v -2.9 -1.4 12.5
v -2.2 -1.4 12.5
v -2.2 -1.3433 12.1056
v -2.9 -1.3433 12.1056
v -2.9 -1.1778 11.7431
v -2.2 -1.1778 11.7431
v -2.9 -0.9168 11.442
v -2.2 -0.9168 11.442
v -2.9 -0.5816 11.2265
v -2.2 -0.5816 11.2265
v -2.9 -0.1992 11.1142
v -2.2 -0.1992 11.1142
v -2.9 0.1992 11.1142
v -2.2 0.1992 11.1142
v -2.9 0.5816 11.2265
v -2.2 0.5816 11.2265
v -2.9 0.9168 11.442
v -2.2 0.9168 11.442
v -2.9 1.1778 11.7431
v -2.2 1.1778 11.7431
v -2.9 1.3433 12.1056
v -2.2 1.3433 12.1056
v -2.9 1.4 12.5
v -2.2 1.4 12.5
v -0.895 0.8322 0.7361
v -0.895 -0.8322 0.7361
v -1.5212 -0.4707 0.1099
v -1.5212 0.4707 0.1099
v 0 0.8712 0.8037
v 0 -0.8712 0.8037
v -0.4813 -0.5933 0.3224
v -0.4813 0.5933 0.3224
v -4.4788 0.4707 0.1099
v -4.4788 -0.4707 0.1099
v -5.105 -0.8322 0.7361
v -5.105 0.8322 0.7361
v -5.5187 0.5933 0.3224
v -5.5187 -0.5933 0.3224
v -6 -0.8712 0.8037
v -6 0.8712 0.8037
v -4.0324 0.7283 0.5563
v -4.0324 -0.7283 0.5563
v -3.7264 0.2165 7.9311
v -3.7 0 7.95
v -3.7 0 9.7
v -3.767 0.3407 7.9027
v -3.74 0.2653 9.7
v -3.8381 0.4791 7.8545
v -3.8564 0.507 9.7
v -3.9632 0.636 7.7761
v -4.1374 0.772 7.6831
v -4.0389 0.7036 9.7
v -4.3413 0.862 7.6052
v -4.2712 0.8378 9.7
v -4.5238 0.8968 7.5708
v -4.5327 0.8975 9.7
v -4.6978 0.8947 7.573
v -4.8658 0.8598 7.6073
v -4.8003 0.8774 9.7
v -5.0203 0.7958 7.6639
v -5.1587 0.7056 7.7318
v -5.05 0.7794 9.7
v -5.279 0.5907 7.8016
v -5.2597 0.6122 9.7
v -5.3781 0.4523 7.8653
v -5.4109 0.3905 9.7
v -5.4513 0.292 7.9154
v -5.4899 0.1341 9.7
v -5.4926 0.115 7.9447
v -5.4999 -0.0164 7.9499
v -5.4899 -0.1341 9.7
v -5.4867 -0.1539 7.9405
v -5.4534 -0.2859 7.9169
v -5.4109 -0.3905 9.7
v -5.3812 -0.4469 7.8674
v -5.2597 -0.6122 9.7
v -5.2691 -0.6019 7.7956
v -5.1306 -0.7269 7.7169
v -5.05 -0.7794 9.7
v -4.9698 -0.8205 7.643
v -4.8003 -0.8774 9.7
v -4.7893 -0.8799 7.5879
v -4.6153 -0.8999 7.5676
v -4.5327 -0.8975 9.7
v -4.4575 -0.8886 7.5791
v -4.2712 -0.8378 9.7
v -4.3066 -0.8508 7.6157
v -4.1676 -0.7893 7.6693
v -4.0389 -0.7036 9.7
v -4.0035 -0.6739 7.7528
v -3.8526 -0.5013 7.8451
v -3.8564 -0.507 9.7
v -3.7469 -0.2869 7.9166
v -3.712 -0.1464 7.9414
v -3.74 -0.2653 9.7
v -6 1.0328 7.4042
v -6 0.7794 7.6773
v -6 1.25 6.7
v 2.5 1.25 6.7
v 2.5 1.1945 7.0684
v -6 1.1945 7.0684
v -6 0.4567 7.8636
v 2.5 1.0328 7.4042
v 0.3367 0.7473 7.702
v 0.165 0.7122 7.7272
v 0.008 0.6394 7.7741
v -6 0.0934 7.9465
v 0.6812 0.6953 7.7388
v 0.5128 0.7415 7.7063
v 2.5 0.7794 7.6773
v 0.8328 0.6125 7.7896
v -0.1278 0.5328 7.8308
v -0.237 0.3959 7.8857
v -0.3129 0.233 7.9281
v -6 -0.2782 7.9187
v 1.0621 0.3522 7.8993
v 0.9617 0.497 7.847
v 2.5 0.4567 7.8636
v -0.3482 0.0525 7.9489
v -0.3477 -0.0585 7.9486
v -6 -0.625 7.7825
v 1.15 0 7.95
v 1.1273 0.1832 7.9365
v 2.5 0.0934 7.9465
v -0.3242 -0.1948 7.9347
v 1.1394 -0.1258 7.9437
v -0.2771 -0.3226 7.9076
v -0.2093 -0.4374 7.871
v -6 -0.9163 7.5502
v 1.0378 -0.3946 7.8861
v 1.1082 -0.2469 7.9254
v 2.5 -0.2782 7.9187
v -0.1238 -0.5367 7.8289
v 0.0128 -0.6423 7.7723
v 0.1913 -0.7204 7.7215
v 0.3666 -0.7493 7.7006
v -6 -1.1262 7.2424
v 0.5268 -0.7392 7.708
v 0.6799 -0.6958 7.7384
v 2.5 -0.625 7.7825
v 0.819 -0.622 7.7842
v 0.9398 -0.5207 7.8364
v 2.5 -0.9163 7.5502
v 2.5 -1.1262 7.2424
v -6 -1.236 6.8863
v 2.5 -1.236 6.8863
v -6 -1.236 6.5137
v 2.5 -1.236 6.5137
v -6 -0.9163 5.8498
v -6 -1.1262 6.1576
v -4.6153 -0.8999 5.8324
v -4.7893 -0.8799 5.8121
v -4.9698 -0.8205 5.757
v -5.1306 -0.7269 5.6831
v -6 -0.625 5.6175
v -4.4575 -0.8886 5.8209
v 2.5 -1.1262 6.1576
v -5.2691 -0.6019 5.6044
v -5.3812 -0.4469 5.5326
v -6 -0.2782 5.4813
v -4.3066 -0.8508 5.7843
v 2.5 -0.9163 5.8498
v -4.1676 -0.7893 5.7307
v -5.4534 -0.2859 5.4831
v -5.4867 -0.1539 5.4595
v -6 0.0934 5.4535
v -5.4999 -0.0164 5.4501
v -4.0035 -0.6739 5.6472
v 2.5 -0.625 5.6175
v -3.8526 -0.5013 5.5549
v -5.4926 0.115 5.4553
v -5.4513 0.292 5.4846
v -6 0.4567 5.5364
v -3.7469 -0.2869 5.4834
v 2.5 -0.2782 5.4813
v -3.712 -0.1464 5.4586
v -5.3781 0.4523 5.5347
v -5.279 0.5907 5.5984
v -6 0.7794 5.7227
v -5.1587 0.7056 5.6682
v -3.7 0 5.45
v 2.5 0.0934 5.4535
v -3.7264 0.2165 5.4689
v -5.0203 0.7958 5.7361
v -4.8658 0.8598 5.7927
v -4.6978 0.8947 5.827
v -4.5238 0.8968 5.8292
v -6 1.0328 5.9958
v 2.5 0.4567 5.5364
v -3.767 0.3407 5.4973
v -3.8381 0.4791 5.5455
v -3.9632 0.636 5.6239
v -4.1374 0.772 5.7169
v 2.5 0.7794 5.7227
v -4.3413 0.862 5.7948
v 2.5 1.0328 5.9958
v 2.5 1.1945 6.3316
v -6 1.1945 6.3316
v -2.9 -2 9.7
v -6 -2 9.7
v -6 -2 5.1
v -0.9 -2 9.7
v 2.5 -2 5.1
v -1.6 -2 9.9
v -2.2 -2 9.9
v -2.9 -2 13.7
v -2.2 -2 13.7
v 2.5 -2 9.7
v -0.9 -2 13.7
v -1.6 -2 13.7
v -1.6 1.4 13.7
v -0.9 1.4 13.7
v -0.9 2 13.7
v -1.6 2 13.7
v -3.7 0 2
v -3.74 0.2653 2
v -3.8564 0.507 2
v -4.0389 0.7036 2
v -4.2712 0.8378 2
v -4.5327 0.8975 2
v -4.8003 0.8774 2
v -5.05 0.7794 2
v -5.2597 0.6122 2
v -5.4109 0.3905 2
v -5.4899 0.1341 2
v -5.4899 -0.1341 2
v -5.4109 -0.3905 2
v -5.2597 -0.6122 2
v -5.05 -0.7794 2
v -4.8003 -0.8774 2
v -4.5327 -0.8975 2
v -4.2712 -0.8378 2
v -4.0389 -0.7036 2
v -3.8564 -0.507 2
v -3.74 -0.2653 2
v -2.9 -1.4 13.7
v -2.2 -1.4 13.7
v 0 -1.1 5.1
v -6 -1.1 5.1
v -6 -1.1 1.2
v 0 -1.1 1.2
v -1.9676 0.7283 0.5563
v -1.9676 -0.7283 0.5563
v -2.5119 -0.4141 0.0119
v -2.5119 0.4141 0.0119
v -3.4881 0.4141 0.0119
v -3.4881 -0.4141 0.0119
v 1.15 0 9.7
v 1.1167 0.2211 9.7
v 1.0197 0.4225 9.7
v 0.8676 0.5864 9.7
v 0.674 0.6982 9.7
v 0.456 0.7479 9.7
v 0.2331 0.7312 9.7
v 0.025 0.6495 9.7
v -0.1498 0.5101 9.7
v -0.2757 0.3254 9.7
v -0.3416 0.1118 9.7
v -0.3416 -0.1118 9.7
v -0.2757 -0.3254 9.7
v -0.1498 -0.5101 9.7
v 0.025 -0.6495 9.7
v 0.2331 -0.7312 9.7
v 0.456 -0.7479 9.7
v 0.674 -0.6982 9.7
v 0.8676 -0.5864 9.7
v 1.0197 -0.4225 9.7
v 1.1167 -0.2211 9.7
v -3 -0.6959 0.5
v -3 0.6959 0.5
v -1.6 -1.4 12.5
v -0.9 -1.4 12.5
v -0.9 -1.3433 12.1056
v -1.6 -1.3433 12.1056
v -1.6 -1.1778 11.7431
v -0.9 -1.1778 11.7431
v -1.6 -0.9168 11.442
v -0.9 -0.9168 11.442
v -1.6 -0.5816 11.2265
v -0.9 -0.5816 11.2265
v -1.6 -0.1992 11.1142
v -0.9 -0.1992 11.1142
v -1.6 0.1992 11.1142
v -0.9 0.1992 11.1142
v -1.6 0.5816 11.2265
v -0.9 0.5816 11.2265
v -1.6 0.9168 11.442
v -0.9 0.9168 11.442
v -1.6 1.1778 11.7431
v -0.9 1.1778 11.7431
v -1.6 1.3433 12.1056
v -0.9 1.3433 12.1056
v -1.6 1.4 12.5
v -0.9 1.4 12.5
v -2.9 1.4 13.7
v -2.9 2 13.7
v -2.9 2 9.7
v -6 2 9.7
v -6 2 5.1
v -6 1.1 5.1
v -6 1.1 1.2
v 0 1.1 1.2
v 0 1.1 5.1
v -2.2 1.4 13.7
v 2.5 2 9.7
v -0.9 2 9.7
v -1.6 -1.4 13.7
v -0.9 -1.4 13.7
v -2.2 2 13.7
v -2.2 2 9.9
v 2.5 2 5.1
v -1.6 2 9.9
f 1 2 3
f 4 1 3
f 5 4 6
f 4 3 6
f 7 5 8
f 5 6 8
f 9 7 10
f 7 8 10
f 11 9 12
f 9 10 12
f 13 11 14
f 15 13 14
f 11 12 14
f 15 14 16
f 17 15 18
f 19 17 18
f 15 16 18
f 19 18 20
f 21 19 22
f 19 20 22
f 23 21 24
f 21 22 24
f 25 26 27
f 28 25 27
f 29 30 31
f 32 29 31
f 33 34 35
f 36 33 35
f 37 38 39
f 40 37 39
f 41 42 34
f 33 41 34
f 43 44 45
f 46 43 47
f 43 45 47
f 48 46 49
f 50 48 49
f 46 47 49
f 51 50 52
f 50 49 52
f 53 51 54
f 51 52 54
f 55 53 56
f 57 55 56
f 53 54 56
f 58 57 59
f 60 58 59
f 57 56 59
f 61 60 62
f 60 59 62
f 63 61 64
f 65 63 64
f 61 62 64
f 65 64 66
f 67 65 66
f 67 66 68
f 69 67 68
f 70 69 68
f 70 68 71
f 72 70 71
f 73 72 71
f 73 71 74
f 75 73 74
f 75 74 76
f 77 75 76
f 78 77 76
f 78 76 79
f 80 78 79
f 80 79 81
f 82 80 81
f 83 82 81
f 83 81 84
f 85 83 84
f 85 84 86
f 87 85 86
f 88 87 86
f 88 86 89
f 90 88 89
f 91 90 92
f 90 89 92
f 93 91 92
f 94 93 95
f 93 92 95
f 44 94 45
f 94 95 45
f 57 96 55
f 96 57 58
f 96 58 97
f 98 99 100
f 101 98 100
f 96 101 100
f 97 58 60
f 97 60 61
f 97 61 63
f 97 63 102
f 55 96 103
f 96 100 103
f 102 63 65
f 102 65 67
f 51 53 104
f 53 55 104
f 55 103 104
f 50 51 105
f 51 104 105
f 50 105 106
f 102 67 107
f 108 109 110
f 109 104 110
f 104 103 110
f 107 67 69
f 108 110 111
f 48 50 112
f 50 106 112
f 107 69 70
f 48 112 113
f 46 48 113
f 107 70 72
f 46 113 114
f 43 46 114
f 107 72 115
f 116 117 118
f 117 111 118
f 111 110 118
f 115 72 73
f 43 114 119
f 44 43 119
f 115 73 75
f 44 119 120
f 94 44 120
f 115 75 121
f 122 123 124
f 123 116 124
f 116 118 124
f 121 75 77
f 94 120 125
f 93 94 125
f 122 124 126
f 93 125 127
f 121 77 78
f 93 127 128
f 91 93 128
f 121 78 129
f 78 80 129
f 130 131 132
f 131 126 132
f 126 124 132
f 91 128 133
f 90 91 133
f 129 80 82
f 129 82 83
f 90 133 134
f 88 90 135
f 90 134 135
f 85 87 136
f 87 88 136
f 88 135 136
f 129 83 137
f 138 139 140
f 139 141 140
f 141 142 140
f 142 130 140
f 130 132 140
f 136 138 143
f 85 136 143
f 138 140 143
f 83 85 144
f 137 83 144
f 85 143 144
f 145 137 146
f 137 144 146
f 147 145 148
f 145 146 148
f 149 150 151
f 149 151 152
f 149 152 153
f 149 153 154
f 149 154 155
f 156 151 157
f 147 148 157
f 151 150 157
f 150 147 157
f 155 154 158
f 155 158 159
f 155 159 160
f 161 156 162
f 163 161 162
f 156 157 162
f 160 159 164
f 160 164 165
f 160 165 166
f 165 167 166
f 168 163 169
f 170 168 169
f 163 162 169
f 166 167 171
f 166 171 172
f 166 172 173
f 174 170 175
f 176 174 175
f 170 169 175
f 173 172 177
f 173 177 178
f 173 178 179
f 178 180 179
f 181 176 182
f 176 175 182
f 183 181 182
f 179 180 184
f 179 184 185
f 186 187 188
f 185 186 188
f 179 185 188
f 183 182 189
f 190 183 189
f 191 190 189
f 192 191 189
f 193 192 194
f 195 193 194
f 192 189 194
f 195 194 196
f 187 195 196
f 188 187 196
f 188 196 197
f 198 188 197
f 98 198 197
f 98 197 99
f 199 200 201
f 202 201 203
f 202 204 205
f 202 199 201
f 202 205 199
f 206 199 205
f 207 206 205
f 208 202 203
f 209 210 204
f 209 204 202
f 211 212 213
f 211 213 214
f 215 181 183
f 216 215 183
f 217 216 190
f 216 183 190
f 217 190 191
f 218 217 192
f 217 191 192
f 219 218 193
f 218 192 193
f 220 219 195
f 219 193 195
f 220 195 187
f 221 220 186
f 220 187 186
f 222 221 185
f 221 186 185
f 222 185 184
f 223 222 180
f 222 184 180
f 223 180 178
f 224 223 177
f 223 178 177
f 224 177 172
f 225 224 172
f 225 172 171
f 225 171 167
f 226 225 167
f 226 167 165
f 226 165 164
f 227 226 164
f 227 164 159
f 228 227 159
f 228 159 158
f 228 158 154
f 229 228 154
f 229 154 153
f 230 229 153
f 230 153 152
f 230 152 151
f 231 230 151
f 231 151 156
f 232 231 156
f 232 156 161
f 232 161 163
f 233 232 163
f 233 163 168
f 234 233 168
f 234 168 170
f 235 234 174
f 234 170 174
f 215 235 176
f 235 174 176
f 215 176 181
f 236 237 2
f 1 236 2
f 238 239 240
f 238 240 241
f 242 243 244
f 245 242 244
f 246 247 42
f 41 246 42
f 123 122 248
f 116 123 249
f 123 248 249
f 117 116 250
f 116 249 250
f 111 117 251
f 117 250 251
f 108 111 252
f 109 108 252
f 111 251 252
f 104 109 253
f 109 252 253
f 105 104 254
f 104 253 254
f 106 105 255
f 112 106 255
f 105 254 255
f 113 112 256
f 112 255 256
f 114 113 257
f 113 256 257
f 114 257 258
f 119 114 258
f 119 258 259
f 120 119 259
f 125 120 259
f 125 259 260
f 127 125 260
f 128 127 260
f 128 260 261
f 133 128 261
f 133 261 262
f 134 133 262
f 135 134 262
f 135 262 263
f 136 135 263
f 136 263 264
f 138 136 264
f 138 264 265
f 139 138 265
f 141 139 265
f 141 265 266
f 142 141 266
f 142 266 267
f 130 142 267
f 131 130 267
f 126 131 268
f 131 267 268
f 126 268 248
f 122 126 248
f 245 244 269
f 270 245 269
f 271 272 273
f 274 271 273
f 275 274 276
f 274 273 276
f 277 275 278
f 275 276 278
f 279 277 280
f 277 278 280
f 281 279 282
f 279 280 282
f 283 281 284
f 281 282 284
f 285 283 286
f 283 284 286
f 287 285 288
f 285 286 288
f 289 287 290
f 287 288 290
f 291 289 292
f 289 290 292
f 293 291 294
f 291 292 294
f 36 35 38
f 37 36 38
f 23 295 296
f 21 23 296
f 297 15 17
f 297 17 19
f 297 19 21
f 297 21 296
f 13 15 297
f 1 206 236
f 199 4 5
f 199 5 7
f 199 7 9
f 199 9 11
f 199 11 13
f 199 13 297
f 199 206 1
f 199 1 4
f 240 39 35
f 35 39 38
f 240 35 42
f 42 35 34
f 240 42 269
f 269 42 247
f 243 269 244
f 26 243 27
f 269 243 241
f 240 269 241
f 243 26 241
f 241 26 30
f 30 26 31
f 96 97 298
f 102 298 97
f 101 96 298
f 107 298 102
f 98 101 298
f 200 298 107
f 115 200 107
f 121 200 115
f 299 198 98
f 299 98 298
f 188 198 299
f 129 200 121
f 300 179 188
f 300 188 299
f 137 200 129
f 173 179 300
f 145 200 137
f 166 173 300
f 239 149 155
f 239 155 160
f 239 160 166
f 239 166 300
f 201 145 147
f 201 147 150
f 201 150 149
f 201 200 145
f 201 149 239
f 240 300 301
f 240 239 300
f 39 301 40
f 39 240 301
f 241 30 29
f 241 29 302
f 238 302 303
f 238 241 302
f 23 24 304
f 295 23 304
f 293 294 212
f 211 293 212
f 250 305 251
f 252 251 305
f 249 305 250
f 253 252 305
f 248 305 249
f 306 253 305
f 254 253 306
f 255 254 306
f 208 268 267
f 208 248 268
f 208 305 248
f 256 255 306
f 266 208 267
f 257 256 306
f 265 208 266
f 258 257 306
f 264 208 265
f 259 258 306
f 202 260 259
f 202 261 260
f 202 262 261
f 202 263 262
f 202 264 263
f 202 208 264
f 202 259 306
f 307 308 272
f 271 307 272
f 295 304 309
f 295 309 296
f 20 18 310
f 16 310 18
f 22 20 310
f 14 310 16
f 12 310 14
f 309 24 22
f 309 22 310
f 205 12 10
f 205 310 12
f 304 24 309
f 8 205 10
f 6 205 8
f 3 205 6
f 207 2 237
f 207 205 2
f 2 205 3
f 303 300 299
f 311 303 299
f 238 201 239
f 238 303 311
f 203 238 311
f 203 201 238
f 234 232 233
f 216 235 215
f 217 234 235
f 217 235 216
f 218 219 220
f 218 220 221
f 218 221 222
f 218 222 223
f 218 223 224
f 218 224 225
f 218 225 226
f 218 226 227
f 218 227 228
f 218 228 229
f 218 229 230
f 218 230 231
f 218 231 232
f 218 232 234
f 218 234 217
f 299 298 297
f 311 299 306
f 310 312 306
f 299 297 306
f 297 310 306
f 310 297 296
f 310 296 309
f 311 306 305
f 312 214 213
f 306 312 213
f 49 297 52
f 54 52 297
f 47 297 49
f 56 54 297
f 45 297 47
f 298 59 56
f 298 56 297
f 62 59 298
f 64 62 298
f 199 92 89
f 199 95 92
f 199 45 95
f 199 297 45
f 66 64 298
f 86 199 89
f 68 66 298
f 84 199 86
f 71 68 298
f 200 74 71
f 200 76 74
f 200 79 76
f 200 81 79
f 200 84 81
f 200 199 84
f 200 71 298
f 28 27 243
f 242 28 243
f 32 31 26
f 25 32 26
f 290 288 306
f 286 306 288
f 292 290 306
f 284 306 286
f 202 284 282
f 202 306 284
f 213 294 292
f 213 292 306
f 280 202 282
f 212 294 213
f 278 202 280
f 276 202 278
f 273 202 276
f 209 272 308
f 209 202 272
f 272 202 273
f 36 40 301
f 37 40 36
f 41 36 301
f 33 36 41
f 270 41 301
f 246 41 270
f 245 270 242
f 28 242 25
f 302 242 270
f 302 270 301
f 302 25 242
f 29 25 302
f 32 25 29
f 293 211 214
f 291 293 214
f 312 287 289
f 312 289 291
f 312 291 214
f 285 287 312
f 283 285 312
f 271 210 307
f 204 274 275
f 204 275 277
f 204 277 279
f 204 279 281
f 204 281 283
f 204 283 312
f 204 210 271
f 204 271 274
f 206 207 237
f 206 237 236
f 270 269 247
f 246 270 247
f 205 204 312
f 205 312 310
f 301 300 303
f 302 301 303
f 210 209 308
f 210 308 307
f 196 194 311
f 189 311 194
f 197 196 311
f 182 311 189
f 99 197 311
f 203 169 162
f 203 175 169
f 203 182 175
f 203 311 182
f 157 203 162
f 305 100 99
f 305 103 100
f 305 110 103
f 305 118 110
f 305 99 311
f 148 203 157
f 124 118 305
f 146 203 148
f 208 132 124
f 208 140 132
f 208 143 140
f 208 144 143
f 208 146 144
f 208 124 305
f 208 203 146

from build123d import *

# Parameters (mm, degrees)
F1_DEPTH  = 2
F0_W      = 6
F0_H      = 5.1
F2_DEPTH  = 1.1
F3_W      = 2.8
F3_H      = 0.2
F4_DEPTH  = 2
F5_R      = 1.25
F6_DEPTH  = 8.5
F7_R      = 0.75
F8_DEPTH  = 3
F9_R      = 0.9
F10_DEPTH = 7.7
F11_SIZE2 = 0.69282
F11_SIZE  = 1.2
F13_DEPTH = 12.5


with BuildPart() as f1:
    # F0 (on Front) → F1 (new body, symmetric)
    with BuildSketch(Plane.XZ):
        Polygon((-6, 5.1), (0, 5.1), (2.5, 5.1), (2.5, 9.7), (-0.9, 9.7), (-0.9, 13.7), (-1.6, 13.7), (-1.6, 9.9), (-2.2, 9.9), (-2.2, 13.7), (-2.9, 13.7), (-2.9, 9.7), (-6, 9.7), align=None)
    extrude(amount=F1_DEPTH, both=True)

    # F0 (on Front) → F2 (join, symmetric)
    with BuildSketch(Plane.XZ):
        with Locations((-3, 2.55)):
            Rectangle(F0_W, F0_H)
    extrude(amount=F2_DEPTH, both=True)

    # F3 (on face) → F4 (cut)
    with BuildSketch(Plane.YZ.offset(-0.9)):
        with Locations((0, 13.8)):
            Rectangle(F3_W, F3_H)
        with BuildLine():
            Line((-1.4, 13.7), (-1.4, 12.5))
            ThreePointArc((-1.4, 12.5), (0, 11.1), (1.4, 12.5))
            Line((1.4, 12.5), (1.4, 13.7))
            Line((1.4, 13.7), (-1.4, 13.7))
        make_face()
    extrude(amount=-F4_DEPTH, mode=Mode.SUBTRACT)

    # F5 (on face) → F6 (cut)
    with BuildSketch(Plane.YZ.offset(2.5)):
        with Locations((0, 6.7)):
            Circle(F5_R)
    extrude(amount=-F6_DEPTH, mode=Mode.SUBTRACT)

    # F7 (on face) → F8 (cut)
    with BuildSketch(Plane.XY.offset(9.7)):
        with Locations((0.4, 0)):
            Circle(F7_R)
    extrude(amount=-F8_DEPTH, mode=Mode.SUBTRACT)

    # F9 (on face) → F10 (cut)
    with BuildSketch(Plane.XY.offset(9.7)):
        with Locations((-4.6, 0)):
            Circle(F9_R)
    extrude(amount=-F10_DEPTH, mode=Mode.SUBTRACT)

    # F11
    f11_edges = [f1.edges().sort_by_distance(p)[0] for p in [
        (-3, -1.1, 0),
        (-3, 1.1, 0),
    ]]
    chamfer(f11_edges, length=F11_SIZE, length2=F11_SIZE2)

    # F12 (on Front) → F13 (cut, symmetric)
    with BuildSketch(Plane.XZ):
        Polygon((-2.511918, 0.011918), (-3, 0.5), (-3.488082, 0.011918), (-4.032431, 0.556267), (-4.478758, 0.109941), (-5.104953, 0.736136), (-5.5187, 0.322389), (-6, 0.803689), (-6, 0), (0, 0), (0, 0.803689), (-0.4813, 0.322389), (-0.895047, 0.736136), (-1.521242, 0.109941), (-1.967569, 0.556267), align=None)
    extrude(amount=F13_DEPTH, both=True, mode=Mode.SUBTRACT)


solid = f1.part
